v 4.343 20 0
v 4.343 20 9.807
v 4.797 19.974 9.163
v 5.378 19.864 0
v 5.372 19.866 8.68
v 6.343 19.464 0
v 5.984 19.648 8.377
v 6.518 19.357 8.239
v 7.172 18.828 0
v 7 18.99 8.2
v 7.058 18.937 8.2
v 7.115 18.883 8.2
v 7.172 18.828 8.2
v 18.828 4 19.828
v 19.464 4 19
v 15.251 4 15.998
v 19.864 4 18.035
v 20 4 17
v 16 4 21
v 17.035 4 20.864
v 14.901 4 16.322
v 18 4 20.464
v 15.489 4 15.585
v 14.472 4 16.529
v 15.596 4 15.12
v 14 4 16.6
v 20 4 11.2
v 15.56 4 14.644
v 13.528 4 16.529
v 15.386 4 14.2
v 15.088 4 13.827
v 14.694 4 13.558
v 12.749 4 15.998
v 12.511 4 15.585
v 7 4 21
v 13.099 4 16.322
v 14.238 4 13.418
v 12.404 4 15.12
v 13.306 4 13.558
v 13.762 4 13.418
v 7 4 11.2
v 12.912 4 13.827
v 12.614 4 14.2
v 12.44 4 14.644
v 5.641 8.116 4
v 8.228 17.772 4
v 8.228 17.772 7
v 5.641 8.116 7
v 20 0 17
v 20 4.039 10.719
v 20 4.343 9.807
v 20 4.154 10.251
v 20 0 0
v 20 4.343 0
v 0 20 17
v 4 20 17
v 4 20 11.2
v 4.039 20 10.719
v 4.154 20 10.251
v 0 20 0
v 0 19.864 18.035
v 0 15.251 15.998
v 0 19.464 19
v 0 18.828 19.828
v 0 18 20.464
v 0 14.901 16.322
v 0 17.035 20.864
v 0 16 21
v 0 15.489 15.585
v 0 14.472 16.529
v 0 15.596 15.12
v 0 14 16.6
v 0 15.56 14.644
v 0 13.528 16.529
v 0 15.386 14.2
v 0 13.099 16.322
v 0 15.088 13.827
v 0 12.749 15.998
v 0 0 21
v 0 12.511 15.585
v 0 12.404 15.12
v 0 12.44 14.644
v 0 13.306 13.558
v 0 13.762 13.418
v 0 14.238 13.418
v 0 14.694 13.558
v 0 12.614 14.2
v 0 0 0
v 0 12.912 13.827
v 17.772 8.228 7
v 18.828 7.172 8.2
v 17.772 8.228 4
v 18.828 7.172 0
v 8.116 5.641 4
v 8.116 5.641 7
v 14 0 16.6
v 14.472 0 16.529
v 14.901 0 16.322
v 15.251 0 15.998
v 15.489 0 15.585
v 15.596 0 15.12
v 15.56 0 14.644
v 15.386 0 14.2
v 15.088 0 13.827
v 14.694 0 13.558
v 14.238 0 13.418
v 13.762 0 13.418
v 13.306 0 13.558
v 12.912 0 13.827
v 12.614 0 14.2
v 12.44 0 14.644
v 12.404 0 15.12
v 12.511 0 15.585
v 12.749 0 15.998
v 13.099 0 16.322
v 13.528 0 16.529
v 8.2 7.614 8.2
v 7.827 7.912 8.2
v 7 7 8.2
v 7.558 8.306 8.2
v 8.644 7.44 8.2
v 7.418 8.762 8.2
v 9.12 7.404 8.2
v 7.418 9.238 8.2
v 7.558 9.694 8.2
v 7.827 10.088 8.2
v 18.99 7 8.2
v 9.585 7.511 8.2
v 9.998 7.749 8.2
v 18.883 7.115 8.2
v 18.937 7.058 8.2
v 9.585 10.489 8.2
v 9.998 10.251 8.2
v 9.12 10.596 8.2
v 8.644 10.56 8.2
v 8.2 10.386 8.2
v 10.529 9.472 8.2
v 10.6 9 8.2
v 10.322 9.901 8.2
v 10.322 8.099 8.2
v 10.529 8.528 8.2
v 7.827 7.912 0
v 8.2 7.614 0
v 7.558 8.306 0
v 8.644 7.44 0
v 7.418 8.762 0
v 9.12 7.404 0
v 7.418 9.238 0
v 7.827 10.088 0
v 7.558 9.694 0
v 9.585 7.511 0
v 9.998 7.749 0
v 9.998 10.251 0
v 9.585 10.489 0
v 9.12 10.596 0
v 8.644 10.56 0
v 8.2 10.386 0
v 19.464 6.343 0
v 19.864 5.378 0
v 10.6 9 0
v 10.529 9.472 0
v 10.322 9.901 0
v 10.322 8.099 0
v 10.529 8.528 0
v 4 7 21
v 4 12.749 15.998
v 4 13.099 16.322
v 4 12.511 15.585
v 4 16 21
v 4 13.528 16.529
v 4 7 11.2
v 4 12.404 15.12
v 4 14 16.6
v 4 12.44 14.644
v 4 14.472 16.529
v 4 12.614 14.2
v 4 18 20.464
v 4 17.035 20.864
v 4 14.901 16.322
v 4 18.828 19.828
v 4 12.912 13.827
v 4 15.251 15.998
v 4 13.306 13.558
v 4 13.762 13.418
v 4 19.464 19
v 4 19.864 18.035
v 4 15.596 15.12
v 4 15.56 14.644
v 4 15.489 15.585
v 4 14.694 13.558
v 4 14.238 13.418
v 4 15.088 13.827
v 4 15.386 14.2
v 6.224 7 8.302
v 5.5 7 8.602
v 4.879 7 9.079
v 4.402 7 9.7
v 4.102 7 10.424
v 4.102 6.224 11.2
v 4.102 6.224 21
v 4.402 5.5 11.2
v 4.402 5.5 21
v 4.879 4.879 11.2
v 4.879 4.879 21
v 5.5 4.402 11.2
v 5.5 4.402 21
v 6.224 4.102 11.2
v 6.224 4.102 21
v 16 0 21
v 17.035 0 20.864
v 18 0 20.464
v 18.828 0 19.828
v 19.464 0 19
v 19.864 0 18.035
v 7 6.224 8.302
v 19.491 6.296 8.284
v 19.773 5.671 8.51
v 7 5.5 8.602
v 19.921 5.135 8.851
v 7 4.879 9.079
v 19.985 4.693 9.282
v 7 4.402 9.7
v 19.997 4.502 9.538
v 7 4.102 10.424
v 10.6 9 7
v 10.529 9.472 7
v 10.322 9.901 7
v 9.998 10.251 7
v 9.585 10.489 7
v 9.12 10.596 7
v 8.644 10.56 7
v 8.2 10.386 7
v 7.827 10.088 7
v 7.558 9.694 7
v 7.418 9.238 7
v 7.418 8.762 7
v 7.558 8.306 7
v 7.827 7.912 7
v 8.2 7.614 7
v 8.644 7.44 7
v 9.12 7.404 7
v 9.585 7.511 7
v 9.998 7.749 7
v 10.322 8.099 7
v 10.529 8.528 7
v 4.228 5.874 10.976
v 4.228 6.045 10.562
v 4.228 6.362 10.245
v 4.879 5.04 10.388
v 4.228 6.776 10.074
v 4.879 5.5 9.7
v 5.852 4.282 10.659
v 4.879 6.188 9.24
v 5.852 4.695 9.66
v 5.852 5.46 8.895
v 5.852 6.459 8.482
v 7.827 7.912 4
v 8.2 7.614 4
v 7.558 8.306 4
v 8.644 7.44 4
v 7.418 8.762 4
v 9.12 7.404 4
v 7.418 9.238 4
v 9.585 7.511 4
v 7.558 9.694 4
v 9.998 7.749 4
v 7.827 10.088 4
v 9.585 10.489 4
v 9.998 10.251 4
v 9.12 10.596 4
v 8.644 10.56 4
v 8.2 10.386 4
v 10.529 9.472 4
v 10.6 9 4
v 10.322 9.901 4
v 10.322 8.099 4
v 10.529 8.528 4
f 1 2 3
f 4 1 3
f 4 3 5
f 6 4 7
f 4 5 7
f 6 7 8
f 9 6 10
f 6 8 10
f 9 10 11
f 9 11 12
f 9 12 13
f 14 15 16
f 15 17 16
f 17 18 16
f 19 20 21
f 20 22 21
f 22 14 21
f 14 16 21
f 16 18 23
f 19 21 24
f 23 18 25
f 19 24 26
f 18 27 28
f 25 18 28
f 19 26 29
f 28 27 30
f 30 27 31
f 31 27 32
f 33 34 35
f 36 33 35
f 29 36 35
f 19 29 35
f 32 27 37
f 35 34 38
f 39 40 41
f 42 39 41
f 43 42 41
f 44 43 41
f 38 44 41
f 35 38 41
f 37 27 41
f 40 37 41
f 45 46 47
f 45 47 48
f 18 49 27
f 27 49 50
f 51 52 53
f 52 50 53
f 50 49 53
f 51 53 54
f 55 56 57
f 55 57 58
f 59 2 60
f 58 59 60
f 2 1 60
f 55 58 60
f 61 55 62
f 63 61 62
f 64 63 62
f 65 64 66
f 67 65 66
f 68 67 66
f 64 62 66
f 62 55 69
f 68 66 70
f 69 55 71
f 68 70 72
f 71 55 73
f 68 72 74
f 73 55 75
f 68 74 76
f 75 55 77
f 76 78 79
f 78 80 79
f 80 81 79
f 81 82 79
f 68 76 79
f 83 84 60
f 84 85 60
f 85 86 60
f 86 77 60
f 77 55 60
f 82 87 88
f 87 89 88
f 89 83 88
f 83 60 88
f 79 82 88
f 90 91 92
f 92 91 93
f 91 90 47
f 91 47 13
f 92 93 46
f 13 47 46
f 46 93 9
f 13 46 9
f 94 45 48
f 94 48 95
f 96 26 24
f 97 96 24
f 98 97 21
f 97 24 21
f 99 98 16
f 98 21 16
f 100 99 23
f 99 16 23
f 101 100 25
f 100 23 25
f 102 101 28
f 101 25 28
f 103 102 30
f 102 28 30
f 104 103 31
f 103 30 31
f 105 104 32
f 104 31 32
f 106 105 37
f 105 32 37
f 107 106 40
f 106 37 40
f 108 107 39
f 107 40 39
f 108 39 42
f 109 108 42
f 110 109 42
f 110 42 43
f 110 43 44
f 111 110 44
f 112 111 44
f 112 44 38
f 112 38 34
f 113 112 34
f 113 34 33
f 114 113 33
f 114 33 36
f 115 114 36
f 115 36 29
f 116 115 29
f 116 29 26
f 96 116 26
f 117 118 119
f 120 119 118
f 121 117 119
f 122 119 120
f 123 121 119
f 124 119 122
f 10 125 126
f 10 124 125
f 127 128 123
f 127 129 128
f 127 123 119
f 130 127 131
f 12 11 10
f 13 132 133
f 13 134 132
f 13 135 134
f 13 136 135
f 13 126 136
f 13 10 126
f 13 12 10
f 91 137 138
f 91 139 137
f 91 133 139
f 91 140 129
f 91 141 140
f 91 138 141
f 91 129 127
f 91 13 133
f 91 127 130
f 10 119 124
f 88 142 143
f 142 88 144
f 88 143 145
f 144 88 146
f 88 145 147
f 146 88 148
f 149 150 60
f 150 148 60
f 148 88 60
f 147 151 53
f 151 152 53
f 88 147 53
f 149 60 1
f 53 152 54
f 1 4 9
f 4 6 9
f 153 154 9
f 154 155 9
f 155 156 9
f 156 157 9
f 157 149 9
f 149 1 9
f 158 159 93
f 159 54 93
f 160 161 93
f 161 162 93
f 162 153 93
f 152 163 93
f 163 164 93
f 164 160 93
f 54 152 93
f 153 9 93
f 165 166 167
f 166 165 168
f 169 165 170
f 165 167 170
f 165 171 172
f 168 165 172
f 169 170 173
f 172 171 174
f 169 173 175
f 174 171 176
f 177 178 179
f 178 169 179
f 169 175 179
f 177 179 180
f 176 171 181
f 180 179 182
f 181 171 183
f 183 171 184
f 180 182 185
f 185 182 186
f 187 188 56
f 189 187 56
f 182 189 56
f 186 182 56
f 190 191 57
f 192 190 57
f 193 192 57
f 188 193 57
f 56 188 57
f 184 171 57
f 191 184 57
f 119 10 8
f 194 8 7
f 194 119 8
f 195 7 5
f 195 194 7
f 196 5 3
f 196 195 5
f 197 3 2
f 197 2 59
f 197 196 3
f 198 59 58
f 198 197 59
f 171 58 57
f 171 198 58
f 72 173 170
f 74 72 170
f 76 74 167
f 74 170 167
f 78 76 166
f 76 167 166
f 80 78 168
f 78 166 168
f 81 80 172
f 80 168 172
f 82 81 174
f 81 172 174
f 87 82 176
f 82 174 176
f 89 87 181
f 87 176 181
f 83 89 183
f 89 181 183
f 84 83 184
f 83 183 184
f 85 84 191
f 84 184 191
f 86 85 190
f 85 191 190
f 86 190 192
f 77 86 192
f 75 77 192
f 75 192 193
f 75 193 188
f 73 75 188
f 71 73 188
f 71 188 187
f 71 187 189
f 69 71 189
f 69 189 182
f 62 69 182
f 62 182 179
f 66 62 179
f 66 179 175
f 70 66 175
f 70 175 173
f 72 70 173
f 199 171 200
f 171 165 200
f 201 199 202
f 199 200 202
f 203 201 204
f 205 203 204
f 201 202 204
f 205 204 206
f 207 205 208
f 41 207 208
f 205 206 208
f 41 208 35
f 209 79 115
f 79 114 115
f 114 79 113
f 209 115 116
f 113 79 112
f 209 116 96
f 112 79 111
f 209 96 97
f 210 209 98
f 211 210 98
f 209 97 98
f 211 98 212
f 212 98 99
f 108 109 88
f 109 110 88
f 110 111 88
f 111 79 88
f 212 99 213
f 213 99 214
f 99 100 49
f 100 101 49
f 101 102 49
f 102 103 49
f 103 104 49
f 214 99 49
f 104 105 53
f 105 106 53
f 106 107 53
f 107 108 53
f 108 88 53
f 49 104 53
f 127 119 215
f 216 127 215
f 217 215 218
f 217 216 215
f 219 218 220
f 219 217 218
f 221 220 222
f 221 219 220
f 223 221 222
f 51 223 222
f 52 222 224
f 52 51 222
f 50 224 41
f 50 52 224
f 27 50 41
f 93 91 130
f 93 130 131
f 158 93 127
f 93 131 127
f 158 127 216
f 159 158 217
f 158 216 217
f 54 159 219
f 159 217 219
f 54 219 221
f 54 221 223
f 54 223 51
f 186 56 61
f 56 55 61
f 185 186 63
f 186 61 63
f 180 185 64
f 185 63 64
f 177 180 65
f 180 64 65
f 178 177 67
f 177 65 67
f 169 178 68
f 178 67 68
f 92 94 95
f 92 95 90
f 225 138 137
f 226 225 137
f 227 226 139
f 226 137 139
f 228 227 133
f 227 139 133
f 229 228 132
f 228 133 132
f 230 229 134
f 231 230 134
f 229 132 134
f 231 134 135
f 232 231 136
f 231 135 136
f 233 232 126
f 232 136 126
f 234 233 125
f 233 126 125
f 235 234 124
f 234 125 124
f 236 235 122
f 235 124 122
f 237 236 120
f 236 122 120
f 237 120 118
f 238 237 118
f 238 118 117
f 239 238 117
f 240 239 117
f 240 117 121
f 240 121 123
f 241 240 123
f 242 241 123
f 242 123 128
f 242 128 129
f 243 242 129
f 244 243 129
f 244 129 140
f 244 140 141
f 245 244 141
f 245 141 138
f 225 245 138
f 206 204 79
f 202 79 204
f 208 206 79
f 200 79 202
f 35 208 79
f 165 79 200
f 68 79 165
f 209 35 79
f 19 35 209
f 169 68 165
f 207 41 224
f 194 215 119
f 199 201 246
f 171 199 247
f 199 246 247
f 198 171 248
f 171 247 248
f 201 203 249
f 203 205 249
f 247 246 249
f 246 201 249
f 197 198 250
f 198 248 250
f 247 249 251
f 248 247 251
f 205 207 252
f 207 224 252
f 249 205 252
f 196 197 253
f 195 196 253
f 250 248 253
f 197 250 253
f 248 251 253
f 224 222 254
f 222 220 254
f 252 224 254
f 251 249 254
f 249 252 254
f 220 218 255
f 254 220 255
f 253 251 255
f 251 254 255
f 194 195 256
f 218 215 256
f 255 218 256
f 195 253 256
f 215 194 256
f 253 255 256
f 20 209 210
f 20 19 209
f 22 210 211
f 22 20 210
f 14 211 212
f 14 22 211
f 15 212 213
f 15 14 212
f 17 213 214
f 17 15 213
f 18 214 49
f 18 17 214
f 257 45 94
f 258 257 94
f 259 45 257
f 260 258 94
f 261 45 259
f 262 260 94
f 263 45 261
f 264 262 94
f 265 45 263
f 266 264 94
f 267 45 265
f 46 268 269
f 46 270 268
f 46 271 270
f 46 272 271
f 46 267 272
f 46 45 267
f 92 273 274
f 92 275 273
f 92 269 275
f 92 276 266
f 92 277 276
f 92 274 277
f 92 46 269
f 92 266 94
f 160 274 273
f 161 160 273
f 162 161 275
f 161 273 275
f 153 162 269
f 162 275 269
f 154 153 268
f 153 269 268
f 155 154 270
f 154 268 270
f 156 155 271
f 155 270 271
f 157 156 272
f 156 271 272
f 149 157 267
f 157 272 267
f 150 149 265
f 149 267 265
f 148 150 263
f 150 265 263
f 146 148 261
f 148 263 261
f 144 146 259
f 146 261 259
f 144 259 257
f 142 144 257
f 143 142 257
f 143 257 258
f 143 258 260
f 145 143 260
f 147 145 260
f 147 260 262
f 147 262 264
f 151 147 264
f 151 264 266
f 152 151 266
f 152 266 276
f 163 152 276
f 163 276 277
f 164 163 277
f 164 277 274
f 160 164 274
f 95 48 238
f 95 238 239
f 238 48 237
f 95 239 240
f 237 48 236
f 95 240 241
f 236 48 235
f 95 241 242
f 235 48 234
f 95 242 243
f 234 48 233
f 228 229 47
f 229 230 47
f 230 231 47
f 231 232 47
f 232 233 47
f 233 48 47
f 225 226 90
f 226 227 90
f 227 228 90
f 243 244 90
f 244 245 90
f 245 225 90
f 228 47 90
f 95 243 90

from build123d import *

# Parameters (mm, degrees)
BASE_DEPTH                           = 8.2
SIDES_DEPTH                          = 21
F_3_2_3_2_MOUNTING_HOLES_D           = 3.2
F_3_2_3_2_MOUNTING_HOLES_ON_FACE_2_D = 3.2
F_3_2_3_2_MOUNTING_HOLES_ON_FACE_3_D = 3.2
INSIDEFILLET_R                       = 3
OUTSIDEFILLET_R                      = 4
NUTSLOT_START                        = -4
NUTSLOT_DEPTH                        = 3


with BuildPart() as part:
    # Sketch4 → Base (new body)
    with BuildSketch(Plane.XY):
        Polygon((0, 20), (0, 0), (20, 0), (20, 6), (6, 20), align=None)
    extrude(amount=BASE_DEPTH)

    # Sketch4<4> → Sides (add)
    with BuildSketch(Plane.XY):
        Polygon((0, 20), (0, 0), (20, 0), (20, 4), (4, 4), (4, 20), align=None)
    extrude(amount=SIDES_DEPTH)

    # Ø3.2 (3.2) Mounting Holes (through all)
    with Locations(Plane(origin=(14, 0, 15), x_dir=(0, 0, -1), z_dir=(0, -1, 0))):
        with Locations((0, 0)):
            Hole(F_3_2_3_2_MOUNTING_HOLES_D / 2)

    # Ø3.2 (3.2) Mounting Holes on face 2 (through all)
    with Locations(Plane(origin=(0, 14, 15), x_dir=(0, 0, -1), z_dir=(-1, 0, 0))):
        with Locations((0, 0)):
            Hole(F_3_2_3_2_MOUNTING_HOLES_ON_FACE_2_D / 2)

    # Ø3.2 (3.2) Mounting Holes on face 3 (through all)
    with Locations(Plane(origin=(9, 9, 0), x_dir=(-1, 0, 0), z_dir=(0, 0, -1))):
        with Locations((0, 0)):
            Hole(F_3_2_3_2_MOUNTING_HOLES_ON_FACE_3_D / 2)

    # InsideFillet
    insidefillet_edges = [part.edges().sort_by_distance(p)[0] for p in [
        (12, 4, 8.2),
        (4, 4, 14.6),
        (4, 12, 8.2),
    ]]
    fillet(insidefillet_edges, radius=INSIDEFILLET_R)

    # OutsideFillet
    outsidefillet_edges = [part.edges().sort_by_distance(p)[0] for p in [
        (6, 20, 4.185786438),
        (20, 6, 4.185786438),
        (20, 2, 21),
        (2, 20, 21),
    ]]
    fillet(outsidefillet_edges, radius=OUTSIDEFILLET_R)

    # Sketch7 → NutSlot (cut)
    with BuildSketch(Plane(origin=(0, 0, 0), x_dir=(-1, 0, 0), z_dir=(0, 0, -1)).offset(NUTSLOT_START)):
        Polygon((-8.228417185, 17.771582815), (-5.641242789, 8.116116524), (-8.116116524, 5.641242789), (-17.771582815, 8.228417185), align=None)
    extrude(amount=-NUTSLOT_DEPTH, mode=Mode.SUBTRACT)


solid = part.part
